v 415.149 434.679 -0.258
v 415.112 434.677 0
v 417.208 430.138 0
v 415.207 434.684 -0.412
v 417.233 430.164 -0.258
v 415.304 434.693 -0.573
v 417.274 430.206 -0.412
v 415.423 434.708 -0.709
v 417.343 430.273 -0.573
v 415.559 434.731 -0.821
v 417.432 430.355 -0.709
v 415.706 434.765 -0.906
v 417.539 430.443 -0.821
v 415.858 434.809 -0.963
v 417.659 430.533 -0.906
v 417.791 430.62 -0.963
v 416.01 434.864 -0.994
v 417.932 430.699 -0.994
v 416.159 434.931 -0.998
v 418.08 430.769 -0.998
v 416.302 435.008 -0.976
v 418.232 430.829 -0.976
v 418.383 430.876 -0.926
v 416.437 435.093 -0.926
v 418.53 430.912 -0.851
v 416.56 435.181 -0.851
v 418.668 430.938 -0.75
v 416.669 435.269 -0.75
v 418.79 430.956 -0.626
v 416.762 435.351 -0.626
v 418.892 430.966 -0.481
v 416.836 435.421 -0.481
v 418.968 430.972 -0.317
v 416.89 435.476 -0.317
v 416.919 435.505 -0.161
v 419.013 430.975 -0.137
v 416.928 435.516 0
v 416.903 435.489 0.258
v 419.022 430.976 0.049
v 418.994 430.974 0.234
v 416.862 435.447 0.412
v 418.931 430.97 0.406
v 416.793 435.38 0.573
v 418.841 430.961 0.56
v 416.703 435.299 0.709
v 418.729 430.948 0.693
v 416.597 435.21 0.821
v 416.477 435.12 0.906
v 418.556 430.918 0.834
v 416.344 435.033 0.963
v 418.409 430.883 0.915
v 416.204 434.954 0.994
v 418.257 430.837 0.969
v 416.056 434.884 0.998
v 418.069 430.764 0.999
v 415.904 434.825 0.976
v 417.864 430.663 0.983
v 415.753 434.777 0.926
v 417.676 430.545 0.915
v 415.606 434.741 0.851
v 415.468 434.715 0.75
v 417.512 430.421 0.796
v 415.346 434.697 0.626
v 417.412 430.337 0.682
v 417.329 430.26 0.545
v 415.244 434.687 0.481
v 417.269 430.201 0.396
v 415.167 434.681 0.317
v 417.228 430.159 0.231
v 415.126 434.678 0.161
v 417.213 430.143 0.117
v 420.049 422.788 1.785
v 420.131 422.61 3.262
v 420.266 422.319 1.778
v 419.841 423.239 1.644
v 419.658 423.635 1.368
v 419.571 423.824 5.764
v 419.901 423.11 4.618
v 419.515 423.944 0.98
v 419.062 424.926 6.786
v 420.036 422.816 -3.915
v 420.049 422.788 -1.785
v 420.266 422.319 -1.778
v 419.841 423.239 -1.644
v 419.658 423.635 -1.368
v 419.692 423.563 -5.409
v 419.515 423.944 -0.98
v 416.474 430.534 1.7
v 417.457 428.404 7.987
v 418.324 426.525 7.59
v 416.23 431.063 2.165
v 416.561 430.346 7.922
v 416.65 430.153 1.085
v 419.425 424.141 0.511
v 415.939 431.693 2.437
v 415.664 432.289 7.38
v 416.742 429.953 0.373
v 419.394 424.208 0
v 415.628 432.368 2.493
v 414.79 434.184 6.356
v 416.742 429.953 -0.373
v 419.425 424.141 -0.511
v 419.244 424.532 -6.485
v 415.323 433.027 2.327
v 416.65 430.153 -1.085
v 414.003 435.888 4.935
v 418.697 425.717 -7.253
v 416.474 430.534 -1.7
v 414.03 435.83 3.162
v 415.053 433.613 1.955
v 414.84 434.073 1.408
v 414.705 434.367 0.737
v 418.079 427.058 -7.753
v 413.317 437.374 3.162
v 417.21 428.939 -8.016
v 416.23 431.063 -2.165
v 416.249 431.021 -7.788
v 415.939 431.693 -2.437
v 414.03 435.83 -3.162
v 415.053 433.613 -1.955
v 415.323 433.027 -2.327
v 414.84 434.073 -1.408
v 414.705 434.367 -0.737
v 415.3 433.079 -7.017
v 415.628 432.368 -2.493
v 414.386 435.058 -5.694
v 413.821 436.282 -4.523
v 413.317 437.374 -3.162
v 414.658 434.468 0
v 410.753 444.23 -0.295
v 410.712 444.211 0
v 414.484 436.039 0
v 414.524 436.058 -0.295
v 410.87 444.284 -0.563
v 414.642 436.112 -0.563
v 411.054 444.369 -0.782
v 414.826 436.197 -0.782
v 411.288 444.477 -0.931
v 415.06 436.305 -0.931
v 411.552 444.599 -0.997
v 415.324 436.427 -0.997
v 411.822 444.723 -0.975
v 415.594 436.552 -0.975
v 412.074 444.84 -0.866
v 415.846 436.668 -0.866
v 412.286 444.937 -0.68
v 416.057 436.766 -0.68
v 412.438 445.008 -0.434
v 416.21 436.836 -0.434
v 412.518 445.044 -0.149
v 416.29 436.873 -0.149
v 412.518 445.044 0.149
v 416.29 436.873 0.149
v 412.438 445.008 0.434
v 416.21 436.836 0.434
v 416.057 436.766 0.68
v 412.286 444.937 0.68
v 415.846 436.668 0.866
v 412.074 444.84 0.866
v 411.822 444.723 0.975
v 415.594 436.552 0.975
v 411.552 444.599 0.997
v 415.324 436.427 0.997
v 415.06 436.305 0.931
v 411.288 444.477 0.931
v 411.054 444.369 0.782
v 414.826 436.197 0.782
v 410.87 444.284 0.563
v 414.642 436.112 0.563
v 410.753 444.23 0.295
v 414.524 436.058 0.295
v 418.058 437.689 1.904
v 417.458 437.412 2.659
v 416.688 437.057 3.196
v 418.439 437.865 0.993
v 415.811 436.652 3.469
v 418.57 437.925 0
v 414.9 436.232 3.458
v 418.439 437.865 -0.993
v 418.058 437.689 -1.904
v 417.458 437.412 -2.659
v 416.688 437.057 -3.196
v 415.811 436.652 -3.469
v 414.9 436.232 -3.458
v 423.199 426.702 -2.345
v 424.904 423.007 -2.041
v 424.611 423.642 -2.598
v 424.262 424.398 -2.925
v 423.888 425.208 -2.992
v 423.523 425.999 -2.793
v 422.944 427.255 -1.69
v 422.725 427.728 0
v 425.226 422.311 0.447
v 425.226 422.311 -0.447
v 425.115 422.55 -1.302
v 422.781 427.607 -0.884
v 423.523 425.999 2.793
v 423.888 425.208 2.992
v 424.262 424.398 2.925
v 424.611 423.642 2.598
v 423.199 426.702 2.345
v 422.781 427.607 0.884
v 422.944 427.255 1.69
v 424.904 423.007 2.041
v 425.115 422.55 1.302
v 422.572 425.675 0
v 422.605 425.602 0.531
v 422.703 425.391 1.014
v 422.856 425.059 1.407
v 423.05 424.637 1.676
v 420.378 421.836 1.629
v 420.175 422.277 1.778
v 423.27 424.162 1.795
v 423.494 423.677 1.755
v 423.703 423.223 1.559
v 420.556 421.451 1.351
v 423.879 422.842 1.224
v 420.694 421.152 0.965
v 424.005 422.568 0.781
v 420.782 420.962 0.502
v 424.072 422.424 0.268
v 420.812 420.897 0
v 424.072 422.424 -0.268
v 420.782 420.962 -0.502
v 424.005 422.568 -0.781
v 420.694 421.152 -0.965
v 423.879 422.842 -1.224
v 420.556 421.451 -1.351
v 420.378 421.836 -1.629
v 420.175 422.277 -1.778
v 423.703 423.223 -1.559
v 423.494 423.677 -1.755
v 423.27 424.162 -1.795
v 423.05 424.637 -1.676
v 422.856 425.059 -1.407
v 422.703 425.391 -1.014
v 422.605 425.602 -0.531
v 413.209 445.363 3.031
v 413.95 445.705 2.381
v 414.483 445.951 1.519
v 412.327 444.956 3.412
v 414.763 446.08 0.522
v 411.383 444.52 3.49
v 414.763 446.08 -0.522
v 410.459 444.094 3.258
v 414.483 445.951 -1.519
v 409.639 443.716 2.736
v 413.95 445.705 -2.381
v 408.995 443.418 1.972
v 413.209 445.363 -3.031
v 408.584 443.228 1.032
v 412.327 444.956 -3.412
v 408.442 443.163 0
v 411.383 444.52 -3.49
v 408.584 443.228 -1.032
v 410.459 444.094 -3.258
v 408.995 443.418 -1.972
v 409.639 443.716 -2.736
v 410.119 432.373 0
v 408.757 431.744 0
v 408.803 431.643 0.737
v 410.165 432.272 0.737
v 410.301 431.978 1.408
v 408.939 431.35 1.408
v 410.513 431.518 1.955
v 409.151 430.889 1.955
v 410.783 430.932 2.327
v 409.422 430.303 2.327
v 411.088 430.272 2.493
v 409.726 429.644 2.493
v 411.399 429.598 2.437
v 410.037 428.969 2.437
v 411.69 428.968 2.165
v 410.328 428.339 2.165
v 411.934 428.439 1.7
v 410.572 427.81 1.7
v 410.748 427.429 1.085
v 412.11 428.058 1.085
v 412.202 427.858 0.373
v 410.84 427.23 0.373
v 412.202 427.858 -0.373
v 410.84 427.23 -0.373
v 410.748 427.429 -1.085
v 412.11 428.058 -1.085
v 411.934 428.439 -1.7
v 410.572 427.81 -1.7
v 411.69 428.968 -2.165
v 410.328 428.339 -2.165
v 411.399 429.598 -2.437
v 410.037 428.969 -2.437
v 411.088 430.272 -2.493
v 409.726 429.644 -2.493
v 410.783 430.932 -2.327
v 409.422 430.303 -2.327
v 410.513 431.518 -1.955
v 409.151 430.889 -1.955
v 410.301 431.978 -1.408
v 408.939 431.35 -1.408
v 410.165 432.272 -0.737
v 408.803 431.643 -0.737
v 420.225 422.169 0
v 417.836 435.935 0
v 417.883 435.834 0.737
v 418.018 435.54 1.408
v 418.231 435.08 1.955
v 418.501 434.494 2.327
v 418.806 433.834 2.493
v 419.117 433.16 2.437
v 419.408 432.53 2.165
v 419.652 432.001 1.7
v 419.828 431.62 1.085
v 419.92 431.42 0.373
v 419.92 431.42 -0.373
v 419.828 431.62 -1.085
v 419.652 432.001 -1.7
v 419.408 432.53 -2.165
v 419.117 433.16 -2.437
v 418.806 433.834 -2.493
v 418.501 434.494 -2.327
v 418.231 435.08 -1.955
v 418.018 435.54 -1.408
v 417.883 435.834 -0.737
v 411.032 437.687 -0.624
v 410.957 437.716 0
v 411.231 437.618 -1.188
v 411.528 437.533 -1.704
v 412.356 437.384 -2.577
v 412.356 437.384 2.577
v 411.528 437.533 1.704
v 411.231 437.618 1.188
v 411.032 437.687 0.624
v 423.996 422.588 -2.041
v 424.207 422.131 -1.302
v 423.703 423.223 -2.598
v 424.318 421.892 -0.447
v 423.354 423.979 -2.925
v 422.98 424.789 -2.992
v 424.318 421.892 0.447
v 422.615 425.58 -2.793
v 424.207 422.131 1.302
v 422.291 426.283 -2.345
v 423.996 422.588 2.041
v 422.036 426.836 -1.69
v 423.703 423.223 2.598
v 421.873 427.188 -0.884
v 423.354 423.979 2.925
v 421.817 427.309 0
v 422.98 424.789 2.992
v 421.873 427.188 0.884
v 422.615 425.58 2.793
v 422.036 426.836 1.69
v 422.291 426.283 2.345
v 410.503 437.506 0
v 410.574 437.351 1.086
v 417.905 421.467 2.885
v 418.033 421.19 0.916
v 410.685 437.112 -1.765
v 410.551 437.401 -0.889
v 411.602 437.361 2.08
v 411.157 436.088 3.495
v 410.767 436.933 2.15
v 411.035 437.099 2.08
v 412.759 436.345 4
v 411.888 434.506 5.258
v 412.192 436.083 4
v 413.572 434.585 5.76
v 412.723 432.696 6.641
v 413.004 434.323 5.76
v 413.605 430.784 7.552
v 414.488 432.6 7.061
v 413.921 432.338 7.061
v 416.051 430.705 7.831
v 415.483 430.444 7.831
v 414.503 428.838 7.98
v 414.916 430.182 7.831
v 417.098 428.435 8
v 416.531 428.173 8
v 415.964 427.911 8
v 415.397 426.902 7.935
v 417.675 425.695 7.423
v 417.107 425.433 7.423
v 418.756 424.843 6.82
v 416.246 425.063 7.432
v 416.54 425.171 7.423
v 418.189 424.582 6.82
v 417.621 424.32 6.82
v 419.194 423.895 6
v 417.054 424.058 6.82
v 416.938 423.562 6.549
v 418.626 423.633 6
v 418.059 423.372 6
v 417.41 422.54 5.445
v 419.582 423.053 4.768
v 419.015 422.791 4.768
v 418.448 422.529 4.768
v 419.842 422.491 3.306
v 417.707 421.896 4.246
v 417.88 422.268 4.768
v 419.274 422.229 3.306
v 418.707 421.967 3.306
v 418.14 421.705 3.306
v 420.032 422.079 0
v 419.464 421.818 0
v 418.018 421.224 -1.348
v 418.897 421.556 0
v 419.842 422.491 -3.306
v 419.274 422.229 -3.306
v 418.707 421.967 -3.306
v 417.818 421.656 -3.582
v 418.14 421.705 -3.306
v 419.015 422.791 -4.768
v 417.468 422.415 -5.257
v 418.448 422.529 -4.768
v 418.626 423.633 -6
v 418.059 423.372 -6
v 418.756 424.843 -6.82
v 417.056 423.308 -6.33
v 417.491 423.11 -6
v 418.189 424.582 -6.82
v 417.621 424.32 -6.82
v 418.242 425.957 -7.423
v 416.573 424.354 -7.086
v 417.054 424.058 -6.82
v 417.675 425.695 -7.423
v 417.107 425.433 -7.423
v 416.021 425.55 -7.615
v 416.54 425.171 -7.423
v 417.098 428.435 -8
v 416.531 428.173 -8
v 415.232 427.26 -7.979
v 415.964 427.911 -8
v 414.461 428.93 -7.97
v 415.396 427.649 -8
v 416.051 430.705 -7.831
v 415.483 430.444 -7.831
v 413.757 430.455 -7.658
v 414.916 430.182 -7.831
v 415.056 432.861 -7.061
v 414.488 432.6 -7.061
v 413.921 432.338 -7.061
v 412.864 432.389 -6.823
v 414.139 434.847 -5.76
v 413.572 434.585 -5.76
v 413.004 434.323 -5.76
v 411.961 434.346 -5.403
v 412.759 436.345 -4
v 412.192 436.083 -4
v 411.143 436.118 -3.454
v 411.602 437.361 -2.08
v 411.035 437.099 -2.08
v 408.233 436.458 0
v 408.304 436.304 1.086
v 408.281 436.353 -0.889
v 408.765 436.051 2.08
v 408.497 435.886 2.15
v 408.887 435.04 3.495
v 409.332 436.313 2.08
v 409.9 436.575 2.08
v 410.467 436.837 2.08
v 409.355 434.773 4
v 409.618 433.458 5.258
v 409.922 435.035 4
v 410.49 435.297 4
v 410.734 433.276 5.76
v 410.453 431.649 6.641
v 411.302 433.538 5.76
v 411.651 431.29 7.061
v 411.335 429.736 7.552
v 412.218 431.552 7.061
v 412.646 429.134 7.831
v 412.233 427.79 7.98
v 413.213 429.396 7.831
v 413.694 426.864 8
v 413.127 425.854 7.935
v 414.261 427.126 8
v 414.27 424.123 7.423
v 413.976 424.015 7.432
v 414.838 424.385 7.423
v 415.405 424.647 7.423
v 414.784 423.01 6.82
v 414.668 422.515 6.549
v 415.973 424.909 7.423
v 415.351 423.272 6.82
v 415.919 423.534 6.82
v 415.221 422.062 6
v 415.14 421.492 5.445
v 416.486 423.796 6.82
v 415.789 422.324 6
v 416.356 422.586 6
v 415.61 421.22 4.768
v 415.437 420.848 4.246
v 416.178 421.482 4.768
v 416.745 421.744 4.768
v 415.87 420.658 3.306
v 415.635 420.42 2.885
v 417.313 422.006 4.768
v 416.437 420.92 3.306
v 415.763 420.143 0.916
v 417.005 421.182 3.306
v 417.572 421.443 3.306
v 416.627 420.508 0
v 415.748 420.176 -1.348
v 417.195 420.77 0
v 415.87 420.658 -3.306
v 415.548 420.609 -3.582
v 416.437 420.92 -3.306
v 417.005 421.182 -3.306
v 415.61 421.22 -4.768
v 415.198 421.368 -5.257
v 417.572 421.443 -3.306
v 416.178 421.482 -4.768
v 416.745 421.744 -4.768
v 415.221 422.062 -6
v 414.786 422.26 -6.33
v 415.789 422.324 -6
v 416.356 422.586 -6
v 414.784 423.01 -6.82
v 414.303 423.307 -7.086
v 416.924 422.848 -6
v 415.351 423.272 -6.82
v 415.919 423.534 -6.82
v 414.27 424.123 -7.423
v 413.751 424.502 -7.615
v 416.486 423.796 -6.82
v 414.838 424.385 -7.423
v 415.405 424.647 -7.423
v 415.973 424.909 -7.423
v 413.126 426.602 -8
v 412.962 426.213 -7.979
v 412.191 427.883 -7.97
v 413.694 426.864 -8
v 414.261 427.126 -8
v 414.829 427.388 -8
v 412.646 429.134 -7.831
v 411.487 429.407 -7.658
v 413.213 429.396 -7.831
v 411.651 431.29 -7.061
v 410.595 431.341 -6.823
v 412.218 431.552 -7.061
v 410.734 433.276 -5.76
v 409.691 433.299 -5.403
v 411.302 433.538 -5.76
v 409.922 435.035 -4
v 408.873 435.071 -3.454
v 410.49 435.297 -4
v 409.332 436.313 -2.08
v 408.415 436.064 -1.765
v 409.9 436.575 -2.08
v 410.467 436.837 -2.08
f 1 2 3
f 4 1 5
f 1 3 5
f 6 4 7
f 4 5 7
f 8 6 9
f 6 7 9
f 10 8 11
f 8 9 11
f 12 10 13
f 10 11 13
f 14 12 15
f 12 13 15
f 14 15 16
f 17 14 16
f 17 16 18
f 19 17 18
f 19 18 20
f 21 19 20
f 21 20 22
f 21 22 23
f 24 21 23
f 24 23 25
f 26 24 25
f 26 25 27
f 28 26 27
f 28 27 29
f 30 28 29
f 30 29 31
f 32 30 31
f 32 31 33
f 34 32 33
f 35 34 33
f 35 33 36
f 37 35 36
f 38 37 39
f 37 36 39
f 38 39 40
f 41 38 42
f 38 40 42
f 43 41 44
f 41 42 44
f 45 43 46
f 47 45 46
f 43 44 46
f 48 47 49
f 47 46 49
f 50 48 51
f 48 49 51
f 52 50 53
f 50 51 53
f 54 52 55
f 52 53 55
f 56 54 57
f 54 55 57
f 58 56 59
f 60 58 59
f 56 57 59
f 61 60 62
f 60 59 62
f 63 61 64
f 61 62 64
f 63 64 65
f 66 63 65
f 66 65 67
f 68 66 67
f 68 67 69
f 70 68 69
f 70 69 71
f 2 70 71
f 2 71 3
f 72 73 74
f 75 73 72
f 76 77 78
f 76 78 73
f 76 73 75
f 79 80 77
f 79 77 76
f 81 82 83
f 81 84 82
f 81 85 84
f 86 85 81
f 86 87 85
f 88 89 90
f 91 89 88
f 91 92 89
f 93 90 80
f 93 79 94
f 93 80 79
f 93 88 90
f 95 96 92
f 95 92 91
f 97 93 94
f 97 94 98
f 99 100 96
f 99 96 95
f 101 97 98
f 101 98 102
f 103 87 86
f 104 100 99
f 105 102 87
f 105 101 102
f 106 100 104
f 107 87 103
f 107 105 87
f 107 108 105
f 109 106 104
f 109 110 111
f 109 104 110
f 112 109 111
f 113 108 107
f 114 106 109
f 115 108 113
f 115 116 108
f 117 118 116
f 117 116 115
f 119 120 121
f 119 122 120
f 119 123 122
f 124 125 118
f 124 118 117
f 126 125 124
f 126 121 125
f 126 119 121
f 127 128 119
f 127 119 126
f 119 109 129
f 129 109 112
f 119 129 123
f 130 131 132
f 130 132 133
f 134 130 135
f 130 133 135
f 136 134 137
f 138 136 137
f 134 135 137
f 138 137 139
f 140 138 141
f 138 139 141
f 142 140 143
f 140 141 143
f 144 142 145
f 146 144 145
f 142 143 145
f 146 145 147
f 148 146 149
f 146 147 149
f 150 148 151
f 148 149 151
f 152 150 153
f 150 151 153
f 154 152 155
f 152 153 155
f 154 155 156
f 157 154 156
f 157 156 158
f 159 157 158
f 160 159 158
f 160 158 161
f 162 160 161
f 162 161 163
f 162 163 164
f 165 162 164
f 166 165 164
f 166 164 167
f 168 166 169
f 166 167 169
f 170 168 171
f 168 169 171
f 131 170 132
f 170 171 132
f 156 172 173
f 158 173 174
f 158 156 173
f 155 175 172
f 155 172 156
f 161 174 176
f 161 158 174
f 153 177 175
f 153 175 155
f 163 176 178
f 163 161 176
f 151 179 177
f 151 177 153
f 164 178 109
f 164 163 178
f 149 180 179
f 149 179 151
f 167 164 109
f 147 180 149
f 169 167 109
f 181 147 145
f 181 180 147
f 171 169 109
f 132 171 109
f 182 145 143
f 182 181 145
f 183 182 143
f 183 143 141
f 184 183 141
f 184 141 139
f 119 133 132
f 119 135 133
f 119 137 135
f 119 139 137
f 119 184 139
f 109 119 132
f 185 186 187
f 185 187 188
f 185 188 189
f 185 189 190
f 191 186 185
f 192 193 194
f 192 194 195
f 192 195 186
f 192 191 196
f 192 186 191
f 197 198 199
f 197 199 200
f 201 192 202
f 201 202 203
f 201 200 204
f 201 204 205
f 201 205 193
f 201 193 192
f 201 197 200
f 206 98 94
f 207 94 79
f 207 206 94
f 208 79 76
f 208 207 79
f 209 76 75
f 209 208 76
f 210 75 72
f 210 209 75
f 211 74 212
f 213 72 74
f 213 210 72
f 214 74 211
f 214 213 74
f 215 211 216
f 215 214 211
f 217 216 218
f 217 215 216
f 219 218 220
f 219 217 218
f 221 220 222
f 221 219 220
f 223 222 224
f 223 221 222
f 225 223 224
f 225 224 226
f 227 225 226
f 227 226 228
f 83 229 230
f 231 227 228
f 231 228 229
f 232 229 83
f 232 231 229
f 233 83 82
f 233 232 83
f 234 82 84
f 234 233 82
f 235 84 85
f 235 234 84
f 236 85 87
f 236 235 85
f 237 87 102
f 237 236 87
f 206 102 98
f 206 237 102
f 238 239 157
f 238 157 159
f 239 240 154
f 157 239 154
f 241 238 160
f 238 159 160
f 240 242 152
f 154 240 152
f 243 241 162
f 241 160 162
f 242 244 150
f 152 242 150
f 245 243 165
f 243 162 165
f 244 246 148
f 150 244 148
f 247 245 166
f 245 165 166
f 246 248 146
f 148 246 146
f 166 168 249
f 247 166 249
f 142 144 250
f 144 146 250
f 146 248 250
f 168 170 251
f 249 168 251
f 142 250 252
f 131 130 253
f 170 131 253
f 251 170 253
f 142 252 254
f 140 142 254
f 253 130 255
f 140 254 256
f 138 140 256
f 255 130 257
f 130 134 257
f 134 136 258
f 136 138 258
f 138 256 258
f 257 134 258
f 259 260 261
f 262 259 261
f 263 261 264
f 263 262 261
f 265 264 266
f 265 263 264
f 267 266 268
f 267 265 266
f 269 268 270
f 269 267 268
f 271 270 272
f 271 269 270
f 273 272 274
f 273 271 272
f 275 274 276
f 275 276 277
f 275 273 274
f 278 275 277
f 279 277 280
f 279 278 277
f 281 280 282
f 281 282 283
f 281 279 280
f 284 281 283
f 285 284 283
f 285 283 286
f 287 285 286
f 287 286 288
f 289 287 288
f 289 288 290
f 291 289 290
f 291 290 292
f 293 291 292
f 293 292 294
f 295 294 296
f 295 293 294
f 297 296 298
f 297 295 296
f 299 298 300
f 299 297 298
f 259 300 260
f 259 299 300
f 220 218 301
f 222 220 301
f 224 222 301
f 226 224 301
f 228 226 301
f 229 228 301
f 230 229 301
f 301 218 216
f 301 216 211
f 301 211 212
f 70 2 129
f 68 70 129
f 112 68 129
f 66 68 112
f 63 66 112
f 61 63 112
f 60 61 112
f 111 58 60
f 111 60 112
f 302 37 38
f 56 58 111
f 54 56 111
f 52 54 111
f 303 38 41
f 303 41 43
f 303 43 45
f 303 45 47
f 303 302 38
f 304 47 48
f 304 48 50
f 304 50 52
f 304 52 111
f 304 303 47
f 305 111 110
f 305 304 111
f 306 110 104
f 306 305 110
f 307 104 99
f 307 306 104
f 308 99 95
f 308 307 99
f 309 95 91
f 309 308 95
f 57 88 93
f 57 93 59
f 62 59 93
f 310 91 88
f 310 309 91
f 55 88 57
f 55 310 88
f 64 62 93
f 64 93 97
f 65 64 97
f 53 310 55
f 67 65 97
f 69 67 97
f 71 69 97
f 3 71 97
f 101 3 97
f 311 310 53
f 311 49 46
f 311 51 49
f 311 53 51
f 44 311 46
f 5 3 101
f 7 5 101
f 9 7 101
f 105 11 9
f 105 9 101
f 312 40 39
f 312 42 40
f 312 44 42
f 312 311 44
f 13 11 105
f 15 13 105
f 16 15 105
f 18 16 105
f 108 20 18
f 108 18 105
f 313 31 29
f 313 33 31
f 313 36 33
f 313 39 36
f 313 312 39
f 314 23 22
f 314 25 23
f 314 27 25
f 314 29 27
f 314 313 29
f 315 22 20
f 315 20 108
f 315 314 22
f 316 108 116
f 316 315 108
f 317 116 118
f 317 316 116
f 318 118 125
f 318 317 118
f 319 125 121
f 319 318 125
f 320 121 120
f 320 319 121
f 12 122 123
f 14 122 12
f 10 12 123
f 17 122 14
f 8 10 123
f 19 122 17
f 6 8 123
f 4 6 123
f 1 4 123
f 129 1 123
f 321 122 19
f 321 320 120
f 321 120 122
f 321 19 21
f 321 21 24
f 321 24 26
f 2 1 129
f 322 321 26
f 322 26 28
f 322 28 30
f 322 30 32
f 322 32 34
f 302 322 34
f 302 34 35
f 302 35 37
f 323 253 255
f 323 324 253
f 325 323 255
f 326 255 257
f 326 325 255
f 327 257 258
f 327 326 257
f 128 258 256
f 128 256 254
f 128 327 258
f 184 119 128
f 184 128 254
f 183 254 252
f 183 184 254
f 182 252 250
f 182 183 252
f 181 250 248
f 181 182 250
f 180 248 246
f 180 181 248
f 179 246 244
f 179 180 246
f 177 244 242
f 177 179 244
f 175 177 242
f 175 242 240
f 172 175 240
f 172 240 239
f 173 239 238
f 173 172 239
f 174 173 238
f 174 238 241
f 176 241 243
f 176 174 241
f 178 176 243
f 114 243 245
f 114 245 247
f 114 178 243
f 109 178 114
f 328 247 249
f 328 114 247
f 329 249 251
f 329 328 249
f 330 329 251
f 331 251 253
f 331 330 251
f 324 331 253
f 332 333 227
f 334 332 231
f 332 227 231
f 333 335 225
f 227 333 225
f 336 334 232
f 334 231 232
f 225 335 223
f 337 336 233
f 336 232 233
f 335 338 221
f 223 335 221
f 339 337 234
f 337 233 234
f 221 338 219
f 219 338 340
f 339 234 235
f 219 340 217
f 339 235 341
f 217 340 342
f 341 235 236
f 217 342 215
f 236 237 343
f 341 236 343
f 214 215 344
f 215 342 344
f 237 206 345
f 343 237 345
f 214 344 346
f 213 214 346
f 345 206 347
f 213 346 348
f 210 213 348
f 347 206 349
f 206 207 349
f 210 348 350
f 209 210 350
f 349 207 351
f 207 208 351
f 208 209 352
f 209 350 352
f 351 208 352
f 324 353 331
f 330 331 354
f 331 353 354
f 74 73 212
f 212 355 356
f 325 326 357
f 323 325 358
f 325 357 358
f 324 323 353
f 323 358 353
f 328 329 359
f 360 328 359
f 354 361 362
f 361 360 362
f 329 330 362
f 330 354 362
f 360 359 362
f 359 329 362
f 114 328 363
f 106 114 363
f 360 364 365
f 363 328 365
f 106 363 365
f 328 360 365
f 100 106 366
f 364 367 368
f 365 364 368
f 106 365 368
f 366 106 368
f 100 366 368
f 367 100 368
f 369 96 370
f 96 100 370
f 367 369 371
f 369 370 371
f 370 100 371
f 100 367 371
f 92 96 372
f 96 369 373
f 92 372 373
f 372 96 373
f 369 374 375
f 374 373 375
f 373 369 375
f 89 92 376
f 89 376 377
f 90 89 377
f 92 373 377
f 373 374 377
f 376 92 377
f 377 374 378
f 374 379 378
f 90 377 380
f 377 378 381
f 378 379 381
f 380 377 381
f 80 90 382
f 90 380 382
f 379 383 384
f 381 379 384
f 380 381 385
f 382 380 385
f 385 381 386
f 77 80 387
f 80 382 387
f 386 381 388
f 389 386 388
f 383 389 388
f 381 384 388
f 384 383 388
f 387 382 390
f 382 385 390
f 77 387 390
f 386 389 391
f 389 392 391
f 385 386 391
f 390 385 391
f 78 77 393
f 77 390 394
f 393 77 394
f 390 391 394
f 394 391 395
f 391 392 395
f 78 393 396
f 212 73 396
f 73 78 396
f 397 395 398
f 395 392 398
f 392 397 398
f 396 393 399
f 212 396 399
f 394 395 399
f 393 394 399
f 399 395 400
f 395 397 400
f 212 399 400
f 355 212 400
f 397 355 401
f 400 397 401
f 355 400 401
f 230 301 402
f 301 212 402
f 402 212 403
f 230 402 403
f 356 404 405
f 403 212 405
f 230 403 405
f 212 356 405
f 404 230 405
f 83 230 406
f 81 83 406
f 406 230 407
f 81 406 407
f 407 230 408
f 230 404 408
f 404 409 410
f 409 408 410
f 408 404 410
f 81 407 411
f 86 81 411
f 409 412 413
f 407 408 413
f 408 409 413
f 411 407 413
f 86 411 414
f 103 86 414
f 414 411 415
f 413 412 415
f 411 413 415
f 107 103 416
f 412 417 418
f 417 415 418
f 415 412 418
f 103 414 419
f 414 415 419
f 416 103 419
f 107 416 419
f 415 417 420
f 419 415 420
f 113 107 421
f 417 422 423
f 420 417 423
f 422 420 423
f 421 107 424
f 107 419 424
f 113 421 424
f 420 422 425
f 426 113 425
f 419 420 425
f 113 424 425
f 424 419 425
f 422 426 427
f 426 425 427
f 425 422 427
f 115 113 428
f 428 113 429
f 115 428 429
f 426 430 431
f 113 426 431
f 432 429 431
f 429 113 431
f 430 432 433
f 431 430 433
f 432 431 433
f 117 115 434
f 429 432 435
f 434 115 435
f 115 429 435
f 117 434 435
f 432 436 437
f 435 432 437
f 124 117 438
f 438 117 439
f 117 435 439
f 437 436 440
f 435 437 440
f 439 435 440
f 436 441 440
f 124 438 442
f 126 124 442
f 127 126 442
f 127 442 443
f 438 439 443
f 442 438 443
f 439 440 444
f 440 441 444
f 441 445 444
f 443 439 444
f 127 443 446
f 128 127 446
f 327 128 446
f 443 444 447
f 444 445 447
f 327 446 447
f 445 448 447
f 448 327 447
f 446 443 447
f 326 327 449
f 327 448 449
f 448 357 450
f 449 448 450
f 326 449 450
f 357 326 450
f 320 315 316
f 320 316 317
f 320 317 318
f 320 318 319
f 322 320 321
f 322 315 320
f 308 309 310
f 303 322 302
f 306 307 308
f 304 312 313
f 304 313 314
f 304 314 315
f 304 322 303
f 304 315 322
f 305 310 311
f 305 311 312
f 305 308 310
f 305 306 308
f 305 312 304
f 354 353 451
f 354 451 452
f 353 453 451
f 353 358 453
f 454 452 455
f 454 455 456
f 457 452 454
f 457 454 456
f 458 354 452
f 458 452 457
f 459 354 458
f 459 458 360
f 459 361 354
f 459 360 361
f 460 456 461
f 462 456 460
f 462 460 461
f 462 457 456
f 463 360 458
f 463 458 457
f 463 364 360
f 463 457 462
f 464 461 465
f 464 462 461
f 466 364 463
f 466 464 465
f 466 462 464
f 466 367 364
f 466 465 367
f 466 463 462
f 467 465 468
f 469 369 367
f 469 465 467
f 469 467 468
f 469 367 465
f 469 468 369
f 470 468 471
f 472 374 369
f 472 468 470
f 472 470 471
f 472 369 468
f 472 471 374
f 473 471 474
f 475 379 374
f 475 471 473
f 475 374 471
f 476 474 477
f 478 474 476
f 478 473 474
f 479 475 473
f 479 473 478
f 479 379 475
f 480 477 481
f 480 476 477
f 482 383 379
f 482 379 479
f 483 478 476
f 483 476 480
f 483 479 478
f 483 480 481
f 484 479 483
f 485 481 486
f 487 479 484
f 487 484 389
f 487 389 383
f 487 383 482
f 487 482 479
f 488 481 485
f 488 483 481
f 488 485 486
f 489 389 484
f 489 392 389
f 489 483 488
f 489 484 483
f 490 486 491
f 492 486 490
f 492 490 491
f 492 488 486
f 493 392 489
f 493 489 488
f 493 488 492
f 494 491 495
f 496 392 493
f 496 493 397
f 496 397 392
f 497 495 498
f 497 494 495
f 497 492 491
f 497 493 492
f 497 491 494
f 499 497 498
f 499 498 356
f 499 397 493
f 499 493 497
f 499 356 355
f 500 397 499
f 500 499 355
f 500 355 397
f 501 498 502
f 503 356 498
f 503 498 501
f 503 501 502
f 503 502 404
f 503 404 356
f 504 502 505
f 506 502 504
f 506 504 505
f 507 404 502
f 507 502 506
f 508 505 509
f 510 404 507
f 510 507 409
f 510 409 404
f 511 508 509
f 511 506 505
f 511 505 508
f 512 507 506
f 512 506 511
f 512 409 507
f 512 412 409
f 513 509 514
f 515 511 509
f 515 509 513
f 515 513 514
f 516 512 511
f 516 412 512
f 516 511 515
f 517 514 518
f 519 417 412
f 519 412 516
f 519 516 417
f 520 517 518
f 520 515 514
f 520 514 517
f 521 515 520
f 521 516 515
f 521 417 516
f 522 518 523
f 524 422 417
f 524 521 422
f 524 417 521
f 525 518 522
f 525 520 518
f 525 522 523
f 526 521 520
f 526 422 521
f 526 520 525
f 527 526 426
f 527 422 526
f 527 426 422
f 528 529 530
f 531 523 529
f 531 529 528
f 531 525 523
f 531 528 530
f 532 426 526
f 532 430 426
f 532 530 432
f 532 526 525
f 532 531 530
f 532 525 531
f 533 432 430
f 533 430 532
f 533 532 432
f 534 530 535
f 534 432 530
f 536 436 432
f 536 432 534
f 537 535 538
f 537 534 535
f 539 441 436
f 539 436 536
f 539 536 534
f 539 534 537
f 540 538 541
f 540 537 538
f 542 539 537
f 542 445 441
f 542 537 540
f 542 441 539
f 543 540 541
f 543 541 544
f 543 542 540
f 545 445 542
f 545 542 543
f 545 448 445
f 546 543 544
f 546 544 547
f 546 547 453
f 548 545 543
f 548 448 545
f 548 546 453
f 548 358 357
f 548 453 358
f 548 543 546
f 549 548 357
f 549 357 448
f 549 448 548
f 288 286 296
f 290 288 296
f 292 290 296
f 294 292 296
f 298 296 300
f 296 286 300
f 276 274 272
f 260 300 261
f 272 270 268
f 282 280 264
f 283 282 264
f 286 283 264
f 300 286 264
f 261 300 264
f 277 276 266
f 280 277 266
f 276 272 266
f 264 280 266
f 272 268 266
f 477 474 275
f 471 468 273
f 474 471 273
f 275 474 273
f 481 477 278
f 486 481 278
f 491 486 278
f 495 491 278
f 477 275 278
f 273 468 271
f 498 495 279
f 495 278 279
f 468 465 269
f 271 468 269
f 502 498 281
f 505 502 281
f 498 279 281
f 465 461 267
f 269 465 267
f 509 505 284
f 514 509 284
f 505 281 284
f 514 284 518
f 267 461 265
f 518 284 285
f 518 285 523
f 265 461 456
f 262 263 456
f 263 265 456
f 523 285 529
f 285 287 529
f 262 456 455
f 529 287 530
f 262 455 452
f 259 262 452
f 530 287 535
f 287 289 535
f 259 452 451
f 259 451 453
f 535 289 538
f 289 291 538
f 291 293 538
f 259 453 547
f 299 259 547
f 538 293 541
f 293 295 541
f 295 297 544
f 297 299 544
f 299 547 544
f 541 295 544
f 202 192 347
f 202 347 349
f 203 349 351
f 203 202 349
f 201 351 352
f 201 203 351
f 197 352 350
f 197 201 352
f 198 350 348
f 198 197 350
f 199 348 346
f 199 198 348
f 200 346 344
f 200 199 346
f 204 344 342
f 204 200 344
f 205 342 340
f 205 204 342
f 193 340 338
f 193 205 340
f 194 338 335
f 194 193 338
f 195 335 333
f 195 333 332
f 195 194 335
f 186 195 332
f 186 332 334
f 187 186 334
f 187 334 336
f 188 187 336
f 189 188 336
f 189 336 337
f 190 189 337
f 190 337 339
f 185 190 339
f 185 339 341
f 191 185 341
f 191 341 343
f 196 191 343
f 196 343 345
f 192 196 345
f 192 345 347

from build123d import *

# Parameters (mm, degrees)
PLACA_DEPTH                    = 2.5
BUJE_CABLE_PROFILE_R           = 3.5
TORNILLO_PISACABLES_PROFILE_R  = 2.5
PASO_CABLE_PRINCIPAL_PROFILE_R = 1
PESTANA_PROFILE_R              = 1.8
LABIO_PROFILE_R                = 3


with BuildPart() as part:
    # Sk_Placa → Placa (new, symmetric)
    with BuildSketch(Plane(origin=(504.880130221, 233.021598564, 0), x_dir=(0, 0, 1), z_dir=(-0.9079593845004517, -0.41905817746174717, 0))):
        with BuildLine():
            add(Edge.make_bspline(
                [(0, 225.213202705), (1.404685151, 225.213202705), (5.902868455, 222.284529944), (9.072068195, 215.843391455), (6.4788047, 208.217156085), (0, 206.670955869), (-6.4788047, 208.217156085), (-9.072068195, 215.843391455), (-5.902868455, 222.284529944), (-1.404685151, 225.213202705), (0, 225.213202705)],
                knots=[0, 0, 0, 0, 0.085901139, 0.275078775, 0.378517444, 0.5, 0.621482556, 0.724921225, 0.914098861, 1, 1, 1, 1], degree=3))
        make_face()
    extrude(amount=PLACA_DEPTH, both=True)

    # Buje_cable: sweep along a curve in space
    with BuildLine() as buje_cable_path:
        Line((411.620184428, 444.63002849, 0), (415.391708025, 436.458394029, 0))
    # Buje_cable profile (on start of the path) → Buje_cable (sweep)
    with BuildSketch(Plane(origin=(411.620184428, 444.63002849, 0), x_dir=(-0.9079593845004499, -0.4190581774617505, 0), z_dir=(0.41905817746175056, -0.9079593845004501, 0))):
        Circle(BUJE_CABLE_PROFILE_R)
    sweep(path=buje_cable_path.line)

    # Tornillo_pisacables: sweep along a curve in space
    with BuildLine() as tornillo_pisacables_path:
        Line((409.804265659, 429.474091072, 0), (418.883859504, 433.664672846, 0))
    # Tornillo_pisacables profile (on start of the path) → Tornillo_pisacables (sweep)
    with BuildSketch(Plane(origin=(409.804265659, 429.474091072, 0), x_dir=(-0.4190581774617444, 0.9079593845004529, 0), z_dir=(0.9079593845004529, 0.4190581774617444, 0))):
        Circle(TORNILLO_PISACABLES_PROFILE_R)
    sweep(path=tornillo_pisacables_path.line)

    # Paso_cable_principal: sweep along a curve in space
    with BuildLine() as paso_cable_principal_path:
        Line((410.782068073, 446.445947259, 0), (418.325115268, 430.102678338, 0))
    # Paso_cable_principal profile (on start of the path) → Paso_cable_principal (sweep, cut)
    with BuildSketch(Plane(origin=(410.782068073, 446.445947259, 0), x_dir=(-0.9079593845004518, -0.41905817746174673, 0), z_dir=(0.41905817746174673, -0.9079593845004518, 0))):
        Circle(PASO_CABLE_PRINCIPAL_PROFILE_R)
    sweep(path=paso_cable_principal_path.line, mode=Mode.SUBTRACT)

    # Pestana: sweep along a curve in space
    with BuildLine() as pestana_path:
        Line((420.057222401, 422.531693932, 0), (423.325876185, 424.04030337, 0))
    # Pestana profile (on start of the path) → Pestana (sweep)
    with BuildSketch(Plane(origin=(420.057222401, 422.531693932, 0), x_dir=(-0.4190581774617379, 0.9079593845004559, 0), z_dir=(0.9079593845004559, 0.4190581774617379, 0))):
        Circle(PESTANA_PROFILE_R)
    sweep(path=pestana_path.line)

    # Labio: sweep along a curve in space
    with BuildLine() as labio_path:
        Line((423.074441279, 424.585079001, 0), (423.982400663, 425.004137179, 0))
    # Labio profile (on start of the path) → Labio (sweep)
    with BuildSketch(Plane(origin=(423.074441279, 424.585079001, 0), x_dir=(-0.4190581774617578, 0.9079593845004467, 0), z_dir=(0.9079593845004467, 0.4190581774617578, 0))):
        Circle(LABIO_PROFILE_R)
    sweep(path=labio_path.line)


solid = part.part
